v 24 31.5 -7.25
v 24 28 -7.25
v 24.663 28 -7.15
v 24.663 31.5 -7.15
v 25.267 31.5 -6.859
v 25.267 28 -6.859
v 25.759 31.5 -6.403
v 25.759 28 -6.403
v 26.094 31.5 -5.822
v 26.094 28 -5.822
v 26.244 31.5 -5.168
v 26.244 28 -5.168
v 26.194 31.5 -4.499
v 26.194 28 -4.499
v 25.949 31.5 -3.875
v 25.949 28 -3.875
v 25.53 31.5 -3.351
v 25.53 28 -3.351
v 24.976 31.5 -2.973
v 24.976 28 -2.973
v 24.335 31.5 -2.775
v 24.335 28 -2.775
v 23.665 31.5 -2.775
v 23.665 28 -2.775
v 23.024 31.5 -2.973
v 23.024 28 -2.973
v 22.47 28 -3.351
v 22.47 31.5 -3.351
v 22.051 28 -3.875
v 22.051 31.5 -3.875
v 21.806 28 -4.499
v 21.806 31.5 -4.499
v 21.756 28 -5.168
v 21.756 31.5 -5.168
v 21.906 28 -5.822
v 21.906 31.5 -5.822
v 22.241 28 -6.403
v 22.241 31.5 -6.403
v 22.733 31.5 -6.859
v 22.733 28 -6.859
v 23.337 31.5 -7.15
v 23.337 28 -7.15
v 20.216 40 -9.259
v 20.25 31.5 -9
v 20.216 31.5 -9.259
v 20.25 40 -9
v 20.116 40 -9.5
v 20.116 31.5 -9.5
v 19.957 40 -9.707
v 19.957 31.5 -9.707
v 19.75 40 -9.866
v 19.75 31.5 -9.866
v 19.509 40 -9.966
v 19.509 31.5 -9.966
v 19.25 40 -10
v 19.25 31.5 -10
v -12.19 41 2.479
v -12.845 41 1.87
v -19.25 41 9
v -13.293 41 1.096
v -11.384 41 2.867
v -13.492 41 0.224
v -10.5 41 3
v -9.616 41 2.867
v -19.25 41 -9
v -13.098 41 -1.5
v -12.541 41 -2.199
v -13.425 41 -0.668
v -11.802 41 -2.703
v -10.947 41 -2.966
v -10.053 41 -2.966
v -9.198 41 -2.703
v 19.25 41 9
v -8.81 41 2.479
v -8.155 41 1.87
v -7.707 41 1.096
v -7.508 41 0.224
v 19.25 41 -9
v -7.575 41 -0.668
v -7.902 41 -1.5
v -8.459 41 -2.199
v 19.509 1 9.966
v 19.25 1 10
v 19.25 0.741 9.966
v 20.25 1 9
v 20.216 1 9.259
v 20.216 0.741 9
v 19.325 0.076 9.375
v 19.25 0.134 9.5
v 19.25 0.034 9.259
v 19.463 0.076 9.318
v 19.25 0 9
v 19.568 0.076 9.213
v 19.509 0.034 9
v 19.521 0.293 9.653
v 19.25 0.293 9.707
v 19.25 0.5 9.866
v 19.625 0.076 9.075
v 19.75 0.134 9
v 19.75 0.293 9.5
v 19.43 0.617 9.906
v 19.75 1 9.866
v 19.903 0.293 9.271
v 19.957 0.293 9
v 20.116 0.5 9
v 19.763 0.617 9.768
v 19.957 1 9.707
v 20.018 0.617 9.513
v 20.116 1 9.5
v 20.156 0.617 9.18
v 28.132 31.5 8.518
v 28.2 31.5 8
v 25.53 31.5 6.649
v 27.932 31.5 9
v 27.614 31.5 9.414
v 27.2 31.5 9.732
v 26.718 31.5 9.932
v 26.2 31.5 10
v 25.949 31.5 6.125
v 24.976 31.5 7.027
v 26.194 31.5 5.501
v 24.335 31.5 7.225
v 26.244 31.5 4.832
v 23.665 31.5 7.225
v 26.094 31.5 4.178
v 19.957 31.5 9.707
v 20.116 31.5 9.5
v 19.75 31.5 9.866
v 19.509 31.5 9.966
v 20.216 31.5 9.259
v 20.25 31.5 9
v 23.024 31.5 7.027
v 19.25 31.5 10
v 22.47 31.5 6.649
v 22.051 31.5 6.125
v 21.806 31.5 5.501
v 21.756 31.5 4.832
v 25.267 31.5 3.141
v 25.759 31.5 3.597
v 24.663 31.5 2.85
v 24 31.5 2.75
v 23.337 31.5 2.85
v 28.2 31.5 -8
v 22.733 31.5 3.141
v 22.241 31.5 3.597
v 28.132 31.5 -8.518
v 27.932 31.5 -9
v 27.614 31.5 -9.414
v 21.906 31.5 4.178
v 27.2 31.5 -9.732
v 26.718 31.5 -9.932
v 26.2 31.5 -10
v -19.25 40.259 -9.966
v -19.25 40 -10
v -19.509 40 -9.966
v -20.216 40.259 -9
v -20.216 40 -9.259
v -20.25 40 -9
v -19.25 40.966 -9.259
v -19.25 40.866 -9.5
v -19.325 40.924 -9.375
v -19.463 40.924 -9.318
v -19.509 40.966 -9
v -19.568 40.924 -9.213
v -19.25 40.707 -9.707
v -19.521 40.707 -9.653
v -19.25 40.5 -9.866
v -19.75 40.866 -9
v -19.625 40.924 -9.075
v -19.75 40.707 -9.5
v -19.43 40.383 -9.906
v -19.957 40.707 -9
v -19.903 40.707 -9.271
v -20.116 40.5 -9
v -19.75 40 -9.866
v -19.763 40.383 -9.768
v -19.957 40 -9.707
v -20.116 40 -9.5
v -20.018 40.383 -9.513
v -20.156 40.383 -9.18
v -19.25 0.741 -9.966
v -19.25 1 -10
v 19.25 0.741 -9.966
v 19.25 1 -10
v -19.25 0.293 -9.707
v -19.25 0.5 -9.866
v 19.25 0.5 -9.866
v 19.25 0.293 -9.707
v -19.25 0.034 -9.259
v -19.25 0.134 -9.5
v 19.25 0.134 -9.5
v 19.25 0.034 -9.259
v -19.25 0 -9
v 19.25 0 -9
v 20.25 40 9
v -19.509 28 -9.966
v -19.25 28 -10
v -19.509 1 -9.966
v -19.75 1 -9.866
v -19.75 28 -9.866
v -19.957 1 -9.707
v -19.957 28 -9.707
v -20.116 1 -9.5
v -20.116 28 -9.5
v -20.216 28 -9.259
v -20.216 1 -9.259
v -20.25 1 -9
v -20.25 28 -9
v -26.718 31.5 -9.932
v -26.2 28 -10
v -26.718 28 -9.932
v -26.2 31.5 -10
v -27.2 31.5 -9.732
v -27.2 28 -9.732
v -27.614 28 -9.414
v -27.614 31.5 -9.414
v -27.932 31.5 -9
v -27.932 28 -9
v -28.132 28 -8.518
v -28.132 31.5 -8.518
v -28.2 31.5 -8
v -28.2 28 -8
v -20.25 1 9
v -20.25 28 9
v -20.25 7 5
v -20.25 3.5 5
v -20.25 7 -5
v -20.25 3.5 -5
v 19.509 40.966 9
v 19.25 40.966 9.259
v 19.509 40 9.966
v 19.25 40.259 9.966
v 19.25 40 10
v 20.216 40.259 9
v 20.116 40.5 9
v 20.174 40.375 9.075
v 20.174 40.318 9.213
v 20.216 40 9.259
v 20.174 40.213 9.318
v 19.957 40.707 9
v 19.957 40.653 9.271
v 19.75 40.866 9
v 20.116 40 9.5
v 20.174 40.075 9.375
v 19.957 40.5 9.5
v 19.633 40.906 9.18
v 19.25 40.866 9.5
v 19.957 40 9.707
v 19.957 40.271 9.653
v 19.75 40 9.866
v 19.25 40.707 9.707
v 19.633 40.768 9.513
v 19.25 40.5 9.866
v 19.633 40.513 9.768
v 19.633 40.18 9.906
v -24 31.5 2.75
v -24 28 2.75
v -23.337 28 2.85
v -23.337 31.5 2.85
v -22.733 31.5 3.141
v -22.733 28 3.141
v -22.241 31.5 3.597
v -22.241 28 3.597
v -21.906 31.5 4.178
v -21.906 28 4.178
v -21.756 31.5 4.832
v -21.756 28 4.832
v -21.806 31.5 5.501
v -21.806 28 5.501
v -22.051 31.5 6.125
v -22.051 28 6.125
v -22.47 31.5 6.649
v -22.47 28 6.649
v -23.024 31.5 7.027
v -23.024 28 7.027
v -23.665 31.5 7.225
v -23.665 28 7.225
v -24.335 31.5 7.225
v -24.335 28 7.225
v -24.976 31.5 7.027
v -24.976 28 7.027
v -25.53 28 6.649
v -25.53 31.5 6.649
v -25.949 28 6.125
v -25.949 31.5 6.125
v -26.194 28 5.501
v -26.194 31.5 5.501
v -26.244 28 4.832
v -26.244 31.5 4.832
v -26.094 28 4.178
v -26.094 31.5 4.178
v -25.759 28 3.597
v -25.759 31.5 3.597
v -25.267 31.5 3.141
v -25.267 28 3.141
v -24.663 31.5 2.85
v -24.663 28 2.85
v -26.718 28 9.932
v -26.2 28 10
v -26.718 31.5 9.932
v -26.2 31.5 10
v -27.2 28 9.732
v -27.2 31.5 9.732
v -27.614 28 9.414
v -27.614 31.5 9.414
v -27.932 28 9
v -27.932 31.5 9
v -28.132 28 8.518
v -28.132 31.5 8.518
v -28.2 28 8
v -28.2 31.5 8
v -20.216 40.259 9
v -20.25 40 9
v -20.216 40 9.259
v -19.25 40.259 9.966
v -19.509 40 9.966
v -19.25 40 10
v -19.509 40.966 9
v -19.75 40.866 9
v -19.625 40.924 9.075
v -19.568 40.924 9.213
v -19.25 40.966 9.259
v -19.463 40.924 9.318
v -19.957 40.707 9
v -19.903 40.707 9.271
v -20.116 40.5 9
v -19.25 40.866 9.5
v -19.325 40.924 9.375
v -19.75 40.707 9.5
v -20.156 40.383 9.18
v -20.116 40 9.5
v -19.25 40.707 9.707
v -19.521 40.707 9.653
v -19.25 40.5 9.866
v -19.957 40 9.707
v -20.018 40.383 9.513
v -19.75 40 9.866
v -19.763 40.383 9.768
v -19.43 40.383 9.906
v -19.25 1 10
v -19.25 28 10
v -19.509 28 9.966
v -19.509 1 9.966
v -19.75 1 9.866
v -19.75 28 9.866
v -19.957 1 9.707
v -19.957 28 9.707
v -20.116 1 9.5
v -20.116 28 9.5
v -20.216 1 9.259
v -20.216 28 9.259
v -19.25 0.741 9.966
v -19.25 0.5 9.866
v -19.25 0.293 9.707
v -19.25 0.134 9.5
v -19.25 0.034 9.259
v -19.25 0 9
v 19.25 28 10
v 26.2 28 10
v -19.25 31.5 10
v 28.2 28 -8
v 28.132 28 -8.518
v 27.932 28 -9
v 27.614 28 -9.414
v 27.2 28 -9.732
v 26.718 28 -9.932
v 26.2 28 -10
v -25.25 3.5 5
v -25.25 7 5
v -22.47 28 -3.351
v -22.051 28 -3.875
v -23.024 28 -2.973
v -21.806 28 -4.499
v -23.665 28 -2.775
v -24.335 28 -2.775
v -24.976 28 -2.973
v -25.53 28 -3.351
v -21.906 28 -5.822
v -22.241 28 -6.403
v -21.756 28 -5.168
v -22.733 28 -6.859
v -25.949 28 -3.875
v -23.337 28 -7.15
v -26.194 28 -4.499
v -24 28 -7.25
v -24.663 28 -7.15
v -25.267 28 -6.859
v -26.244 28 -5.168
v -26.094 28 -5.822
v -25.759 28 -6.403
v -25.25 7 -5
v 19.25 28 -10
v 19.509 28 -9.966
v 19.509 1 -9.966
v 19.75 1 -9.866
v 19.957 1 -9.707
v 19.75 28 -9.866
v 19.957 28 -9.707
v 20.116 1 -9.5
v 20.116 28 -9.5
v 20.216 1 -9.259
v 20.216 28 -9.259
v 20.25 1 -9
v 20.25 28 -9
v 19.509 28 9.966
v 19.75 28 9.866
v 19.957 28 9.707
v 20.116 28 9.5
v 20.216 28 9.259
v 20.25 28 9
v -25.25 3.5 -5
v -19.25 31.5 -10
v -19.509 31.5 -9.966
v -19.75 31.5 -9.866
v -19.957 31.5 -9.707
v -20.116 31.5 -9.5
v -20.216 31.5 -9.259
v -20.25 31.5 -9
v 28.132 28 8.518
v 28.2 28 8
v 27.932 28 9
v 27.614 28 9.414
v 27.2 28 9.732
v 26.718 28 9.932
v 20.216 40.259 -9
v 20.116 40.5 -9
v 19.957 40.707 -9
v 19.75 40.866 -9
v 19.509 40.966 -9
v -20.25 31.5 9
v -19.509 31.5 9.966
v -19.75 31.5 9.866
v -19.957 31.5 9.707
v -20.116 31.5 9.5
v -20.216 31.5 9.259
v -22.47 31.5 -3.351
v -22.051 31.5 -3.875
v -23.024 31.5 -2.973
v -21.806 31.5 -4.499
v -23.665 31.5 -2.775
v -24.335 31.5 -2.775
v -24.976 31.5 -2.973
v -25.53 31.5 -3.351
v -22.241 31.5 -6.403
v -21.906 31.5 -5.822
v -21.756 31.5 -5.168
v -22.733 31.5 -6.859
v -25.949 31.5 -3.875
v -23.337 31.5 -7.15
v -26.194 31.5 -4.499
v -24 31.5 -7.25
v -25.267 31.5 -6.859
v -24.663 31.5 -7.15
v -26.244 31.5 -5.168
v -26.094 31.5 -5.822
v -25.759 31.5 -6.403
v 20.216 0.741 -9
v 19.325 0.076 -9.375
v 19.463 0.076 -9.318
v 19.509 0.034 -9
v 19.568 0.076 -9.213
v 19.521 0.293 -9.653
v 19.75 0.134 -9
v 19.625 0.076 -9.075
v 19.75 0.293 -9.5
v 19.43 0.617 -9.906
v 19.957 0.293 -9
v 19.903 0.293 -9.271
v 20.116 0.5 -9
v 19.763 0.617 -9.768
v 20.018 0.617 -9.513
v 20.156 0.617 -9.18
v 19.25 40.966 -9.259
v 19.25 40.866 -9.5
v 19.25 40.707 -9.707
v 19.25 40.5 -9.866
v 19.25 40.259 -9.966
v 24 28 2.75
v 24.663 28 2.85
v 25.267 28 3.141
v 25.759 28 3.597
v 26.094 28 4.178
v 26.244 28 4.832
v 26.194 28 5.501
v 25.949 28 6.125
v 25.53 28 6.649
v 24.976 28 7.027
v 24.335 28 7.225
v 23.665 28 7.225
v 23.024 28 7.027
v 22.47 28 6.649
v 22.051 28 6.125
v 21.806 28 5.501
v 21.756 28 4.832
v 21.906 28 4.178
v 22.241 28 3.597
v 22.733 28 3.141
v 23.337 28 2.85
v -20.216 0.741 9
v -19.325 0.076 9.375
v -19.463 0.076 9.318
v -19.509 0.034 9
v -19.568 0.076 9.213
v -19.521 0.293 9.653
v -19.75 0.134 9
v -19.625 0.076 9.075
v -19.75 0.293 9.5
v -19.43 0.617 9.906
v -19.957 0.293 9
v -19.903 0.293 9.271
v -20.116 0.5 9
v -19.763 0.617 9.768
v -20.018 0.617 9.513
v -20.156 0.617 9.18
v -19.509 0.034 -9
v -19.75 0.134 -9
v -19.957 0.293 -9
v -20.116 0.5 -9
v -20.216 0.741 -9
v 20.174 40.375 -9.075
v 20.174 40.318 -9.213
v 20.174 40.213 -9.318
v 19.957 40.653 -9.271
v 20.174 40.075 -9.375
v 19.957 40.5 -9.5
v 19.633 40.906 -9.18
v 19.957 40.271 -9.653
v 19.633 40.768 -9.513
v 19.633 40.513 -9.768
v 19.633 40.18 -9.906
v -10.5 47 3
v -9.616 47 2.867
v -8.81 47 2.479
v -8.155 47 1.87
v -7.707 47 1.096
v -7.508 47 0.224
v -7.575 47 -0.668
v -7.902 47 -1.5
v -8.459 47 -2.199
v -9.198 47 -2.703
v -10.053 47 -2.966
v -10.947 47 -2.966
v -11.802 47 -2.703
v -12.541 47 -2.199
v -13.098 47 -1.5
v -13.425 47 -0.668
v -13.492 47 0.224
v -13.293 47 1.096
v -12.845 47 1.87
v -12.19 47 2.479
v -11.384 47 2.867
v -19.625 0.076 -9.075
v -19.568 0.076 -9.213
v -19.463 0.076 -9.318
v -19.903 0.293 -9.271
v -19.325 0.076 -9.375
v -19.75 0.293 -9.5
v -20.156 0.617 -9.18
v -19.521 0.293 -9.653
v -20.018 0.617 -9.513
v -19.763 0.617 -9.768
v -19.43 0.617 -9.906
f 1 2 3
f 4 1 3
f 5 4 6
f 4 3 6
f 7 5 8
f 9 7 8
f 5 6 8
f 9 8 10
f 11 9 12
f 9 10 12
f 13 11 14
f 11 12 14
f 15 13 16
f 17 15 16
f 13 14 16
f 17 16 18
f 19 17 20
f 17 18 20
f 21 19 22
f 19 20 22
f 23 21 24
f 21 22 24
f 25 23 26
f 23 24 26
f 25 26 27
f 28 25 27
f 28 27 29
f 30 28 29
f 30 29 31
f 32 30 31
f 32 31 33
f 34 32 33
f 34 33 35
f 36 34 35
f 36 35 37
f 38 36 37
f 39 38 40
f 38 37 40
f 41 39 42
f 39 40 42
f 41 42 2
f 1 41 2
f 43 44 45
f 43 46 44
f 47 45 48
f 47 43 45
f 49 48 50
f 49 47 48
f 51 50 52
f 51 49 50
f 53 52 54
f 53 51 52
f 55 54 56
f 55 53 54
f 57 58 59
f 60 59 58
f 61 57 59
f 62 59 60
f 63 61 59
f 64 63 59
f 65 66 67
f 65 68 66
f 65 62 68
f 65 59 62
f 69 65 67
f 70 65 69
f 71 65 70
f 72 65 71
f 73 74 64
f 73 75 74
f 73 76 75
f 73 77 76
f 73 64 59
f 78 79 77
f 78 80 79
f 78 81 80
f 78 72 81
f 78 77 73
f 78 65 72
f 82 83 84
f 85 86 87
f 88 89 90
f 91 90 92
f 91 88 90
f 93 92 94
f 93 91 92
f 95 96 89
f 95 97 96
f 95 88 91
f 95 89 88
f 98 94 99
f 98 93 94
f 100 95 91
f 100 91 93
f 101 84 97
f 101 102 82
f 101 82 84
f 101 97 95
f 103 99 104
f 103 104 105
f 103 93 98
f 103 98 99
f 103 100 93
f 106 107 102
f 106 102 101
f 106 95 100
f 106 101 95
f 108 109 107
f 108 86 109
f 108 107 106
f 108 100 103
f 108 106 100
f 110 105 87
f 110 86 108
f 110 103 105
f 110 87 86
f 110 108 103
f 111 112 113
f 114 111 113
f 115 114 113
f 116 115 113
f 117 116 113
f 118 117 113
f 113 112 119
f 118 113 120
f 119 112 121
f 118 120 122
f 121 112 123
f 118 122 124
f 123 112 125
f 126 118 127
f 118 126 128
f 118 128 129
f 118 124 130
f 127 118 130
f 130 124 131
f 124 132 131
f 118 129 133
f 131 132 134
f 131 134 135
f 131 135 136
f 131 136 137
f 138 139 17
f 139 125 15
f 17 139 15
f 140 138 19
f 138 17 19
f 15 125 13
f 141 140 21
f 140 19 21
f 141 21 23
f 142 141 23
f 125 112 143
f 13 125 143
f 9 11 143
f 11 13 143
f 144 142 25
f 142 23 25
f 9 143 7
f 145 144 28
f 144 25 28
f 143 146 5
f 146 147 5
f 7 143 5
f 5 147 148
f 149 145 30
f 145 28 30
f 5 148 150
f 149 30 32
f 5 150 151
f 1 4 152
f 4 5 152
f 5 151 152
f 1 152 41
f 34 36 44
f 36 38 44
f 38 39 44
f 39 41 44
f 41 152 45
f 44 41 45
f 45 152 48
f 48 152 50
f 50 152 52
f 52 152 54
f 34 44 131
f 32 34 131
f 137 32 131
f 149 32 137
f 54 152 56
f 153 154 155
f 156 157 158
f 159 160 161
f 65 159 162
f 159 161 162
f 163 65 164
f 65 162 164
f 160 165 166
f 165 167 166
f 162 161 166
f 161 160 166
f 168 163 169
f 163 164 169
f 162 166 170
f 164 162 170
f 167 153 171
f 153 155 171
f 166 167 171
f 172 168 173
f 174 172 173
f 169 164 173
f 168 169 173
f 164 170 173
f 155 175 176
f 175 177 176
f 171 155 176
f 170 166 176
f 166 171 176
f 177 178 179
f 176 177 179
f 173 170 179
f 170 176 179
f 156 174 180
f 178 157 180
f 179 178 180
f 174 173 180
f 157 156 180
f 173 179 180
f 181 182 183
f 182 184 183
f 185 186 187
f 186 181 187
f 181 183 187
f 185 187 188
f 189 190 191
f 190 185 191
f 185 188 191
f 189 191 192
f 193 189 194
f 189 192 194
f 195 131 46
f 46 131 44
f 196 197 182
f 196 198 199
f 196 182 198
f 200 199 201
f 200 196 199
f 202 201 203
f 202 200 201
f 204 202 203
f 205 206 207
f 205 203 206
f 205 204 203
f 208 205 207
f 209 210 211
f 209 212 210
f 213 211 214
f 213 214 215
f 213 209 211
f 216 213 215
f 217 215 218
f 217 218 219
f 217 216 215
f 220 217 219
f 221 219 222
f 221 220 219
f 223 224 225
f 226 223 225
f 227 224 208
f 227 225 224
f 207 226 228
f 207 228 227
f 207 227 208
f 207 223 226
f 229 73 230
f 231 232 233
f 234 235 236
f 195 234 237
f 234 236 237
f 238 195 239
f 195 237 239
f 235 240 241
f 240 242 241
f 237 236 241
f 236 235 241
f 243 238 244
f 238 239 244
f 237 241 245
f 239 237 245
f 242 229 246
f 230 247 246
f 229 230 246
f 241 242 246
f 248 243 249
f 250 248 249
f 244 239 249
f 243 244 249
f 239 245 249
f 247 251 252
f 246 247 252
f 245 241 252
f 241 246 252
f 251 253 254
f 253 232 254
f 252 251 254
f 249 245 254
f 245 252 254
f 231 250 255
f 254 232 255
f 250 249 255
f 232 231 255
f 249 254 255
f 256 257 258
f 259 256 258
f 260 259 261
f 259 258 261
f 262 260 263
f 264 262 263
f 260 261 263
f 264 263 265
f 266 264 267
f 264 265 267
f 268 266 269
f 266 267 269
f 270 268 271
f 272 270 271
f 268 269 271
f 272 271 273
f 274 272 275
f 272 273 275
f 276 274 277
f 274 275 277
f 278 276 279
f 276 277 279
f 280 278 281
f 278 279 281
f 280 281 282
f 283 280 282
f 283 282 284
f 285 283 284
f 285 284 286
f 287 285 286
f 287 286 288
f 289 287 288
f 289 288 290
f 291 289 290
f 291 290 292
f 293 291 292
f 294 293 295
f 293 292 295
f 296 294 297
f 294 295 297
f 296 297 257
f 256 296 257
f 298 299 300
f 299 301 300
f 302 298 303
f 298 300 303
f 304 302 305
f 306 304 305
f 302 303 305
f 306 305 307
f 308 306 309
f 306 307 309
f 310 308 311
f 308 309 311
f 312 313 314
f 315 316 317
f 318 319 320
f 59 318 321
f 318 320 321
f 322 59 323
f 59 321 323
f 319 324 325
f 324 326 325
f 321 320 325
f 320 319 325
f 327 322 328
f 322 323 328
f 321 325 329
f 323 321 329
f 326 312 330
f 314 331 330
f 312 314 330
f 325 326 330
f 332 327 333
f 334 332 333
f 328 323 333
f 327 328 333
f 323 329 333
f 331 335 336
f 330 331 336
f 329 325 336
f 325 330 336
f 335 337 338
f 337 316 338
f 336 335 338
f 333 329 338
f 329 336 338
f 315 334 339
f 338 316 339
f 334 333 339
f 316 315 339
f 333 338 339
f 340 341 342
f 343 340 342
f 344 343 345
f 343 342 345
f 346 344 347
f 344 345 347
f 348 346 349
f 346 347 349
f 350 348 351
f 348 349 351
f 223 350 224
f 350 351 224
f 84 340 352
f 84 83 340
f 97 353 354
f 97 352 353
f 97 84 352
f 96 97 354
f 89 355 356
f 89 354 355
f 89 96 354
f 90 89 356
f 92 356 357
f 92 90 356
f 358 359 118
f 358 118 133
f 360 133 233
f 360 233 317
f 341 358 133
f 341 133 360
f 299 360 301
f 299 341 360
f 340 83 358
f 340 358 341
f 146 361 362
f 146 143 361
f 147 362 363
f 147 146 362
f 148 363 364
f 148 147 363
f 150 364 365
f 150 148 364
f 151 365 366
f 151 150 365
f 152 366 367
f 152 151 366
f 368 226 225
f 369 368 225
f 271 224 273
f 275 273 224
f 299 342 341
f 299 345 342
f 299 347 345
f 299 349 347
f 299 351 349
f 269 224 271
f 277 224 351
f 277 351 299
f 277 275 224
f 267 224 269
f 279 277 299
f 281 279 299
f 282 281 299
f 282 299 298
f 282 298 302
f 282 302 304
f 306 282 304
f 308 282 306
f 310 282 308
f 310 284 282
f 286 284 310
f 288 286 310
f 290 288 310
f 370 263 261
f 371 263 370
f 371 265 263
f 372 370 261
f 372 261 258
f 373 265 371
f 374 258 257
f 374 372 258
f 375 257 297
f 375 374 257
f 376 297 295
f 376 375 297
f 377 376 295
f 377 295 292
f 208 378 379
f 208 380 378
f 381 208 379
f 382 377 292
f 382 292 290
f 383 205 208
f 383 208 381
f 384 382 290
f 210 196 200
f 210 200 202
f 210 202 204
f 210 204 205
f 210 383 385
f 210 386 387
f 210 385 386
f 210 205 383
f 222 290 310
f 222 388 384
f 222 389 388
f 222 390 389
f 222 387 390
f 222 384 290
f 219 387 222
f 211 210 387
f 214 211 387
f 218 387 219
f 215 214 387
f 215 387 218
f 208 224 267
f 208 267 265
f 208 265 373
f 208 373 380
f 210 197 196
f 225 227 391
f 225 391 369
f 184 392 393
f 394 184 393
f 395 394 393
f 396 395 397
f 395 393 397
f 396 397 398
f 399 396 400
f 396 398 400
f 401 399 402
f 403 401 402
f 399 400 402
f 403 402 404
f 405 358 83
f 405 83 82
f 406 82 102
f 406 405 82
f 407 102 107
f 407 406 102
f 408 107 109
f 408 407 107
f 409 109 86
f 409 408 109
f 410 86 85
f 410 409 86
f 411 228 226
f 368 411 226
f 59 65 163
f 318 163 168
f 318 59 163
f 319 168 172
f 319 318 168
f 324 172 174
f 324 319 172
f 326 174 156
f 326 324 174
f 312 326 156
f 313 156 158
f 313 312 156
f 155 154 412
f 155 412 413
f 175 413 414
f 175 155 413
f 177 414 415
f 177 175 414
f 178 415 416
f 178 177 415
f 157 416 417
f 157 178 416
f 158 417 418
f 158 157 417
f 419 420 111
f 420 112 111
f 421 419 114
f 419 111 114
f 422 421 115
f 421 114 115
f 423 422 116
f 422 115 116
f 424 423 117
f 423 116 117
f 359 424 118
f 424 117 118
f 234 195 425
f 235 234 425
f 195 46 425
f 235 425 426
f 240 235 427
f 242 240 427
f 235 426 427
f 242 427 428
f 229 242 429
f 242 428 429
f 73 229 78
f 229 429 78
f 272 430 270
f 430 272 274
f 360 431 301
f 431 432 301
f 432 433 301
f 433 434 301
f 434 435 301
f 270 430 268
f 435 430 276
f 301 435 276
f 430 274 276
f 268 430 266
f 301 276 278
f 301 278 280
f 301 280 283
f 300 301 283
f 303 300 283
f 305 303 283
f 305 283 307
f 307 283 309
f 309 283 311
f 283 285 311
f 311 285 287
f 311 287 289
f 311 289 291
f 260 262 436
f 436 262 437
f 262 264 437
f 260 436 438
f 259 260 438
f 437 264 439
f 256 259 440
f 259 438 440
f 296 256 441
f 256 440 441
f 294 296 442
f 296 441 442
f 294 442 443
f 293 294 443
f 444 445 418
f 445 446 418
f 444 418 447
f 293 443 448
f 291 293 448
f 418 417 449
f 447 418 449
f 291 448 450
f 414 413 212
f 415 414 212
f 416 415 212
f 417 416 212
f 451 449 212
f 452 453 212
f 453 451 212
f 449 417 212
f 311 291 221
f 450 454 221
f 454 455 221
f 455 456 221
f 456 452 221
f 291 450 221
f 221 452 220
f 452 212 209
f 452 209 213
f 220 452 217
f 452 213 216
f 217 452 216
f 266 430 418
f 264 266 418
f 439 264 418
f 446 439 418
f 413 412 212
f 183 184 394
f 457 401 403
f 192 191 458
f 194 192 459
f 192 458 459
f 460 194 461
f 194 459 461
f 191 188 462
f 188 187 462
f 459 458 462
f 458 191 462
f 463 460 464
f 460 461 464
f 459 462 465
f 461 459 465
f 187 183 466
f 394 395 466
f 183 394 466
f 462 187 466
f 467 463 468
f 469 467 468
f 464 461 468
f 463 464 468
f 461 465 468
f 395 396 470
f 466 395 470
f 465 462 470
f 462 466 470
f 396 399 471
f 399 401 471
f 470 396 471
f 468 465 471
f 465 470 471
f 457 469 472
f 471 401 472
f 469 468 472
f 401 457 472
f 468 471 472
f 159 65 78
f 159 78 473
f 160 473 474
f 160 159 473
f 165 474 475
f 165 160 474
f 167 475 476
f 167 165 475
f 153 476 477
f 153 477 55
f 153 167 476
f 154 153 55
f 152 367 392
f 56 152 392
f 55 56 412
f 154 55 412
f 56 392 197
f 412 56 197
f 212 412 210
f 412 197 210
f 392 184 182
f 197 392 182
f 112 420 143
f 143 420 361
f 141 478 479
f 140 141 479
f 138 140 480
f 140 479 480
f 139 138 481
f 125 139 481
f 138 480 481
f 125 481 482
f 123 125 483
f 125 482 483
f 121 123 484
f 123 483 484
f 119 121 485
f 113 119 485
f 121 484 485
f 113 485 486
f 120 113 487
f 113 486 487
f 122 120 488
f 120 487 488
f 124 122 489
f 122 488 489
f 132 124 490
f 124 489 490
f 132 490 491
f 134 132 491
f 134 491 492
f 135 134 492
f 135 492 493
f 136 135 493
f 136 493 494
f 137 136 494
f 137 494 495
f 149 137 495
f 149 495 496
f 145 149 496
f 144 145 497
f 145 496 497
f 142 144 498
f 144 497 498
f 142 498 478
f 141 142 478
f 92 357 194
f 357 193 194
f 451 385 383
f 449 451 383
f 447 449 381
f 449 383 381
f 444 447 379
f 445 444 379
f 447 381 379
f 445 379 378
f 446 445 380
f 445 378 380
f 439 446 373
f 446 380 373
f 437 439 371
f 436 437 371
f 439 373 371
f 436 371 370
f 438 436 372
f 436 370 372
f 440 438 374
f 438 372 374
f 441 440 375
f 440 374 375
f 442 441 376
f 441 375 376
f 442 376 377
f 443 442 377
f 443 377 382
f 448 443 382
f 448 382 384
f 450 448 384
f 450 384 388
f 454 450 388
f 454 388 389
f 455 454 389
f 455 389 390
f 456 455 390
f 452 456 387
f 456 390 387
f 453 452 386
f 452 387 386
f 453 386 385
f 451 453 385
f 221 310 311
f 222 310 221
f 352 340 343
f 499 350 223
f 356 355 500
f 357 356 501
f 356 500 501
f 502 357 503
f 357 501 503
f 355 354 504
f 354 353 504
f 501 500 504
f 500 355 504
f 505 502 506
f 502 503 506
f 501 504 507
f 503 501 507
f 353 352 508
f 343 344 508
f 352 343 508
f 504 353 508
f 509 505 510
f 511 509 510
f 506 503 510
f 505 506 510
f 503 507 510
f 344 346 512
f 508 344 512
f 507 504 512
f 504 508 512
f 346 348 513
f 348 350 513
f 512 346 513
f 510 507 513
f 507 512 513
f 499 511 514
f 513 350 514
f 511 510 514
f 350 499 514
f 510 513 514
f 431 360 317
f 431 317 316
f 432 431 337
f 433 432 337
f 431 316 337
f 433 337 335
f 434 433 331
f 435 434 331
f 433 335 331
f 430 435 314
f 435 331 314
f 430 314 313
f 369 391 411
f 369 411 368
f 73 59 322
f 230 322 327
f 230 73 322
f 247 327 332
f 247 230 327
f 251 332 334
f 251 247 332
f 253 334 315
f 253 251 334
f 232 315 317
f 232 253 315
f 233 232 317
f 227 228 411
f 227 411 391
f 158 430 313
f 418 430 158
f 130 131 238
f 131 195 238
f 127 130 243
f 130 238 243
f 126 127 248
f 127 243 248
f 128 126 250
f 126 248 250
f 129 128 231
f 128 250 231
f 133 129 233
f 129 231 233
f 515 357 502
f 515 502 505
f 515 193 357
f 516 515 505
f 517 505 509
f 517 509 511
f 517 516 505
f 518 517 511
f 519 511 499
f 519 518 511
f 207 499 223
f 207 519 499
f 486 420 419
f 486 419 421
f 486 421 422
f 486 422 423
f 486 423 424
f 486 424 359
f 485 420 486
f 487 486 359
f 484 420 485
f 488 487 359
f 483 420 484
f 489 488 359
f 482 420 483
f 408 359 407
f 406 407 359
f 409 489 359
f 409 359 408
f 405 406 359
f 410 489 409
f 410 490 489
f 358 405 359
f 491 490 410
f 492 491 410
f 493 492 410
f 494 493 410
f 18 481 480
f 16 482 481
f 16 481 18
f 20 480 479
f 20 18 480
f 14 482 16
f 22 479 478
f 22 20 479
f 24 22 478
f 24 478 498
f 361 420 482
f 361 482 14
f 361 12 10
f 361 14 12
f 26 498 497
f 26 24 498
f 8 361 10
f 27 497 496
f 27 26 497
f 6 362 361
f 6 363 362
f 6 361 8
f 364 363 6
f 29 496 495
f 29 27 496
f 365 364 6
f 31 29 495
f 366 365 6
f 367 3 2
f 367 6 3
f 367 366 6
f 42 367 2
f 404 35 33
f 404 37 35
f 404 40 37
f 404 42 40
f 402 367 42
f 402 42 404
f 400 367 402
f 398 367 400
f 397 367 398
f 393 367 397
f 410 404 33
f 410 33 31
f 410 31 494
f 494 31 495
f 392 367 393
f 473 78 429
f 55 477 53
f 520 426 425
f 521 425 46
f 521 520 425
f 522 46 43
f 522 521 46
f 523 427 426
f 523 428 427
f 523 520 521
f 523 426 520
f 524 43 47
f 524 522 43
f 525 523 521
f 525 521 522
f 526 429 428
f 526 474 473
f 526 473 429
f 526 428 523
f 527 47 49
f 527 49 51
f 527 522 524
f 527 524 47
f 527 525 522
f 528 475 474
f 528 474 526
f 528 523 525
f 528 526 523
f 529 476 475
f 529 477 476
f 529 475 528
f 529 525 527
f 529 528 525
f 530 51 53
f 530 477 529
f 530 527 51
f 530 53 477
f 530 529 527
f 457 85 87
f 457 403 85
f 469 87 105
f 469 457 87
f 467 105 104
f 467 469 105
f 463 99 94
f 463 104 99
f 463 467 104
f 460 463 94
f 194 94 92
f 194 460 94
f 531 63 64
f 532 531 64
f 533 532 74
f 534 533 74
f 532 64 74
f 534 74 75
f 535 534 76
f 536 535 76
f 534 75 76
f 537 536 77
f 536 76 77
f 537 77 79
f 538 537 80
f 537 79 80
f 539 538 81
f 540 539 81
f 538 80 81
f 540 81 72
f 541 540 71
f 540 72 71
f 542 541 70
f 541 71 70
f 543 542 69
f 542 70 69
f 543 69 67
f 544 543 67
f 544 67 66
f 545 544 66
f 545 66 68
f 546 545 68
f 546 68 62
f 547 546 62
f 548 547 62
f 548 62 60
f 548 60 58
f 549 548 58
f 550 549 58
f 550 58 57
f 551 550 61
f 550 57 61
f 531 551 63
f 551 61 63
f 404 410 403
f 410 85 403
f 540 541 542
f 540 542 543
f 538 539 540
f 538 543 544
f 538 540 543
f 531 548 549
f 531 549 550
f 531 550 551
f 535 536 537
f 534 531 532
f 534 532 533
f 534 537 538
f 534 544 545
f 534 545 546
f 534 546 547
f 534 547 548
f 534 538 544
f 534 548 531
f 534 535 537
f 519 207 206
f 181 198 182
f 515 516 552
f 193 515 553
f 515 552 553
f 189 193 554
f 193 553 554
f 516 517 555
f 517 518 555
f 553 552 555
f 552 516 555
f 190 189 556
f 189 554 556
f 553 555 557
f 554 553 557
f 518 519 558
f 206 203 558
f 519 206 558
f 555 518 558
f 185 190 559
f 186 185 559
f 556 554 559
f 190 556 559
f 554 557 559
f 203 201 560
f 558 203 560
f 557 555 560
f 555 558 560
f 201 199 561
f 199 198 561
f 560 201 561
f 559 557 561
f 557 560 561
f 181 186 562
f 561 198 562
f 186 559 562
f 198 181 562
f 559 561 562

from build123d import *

# Parameters (mm, degrees)
SKETCH1_W           = 40.5
SKETCH1_H           = 20
BOSS_EXTRUDE1_DEPTH = 41
SKETCH2_W           = 56.4
SKETCH2_H           = 20
SKETCH2_R           = 2.25
BOSS_EXTRUDE2_DEPTH = 3.5
SKETCH3_R           = 3
BOSS_EXTRUDE3_DEPTH = 6
SKETCH4_W           = 10
SKETCH4_H           = 3.5
BOSS_EXTRUDE4_DEPTH = 5
FILLET1_R           = 2
FILLET2_R           = 1
FILLET3_R           = 1


with BuildPart() as part:
    # Sketch1 → Boss-Extrude1 (new body)
    with BuildSketch(Plane(origin=(0, 0, 0), x_dir=(1, 0, 0), z_dir=(0, 1, 0))):
        Rectangle(SKETCH1_W, SKETCH1_H)
    extrude(amount=BOSS_EXTRUDE1_DEPTH)

    # Sketch2 → Boss-Extrude2 (add)
    with BuildSketch(Plane(origin=(0, 28, 0), x_dir=(-1, 0, 0), z_dir=(0, -1, 0))):
        Rectangle(SKETCH2_W, SKETCH2_H)
        with Locations(Location((-24, 5, 0), (0, 0, 90))):
            Circle(SKETCH2_R, mode=Mode.SUBTRACT)
        with Locations(Location((24, 5, 0), (0, 0, 90))):
            Circle(SKETCH2_R, mode=Mode.SUBTRACT)
        with Locations(Location((24, -5, 0), (0, 0, 90))):
            Circle(SKETCH2_R, mode=Mode.SUBTRACT)
        with Locations(Location((-24, -5, 0), (0, 0, 90))):
            Circle(SKETCH2_R, mode=Mode.SUBTRACT)
    extrude(amount=-BOSS_EXTRUDE2_DEPTH)

    # Sketch3 → Boss-Extrude3 (add)
    with BuildSketch(Plane(origin=(0, 41, 0), x_dir=(1, 0, 0), z_dir=(0, 1, 0))):
        with Locations(Location((-10.5, 0, 0), (0, 0, 270))):
            Circle(SKETCH3_R)
    extrude(amount=BOSS_EXTRUDE3_DEPTH)

    # Sketch4 → Boss-Extrude4 (add)
    with BuildSketch(Plane.ZY.offset(20.25)):
        with Locations((0, 5.25)):
            Rectangle(SKETCH4_W, SKETCH4_H)
    extrude(amount=BOSS_EXTRUDE4_DEPTH)

    # Fillet1
    fillet1_edges = [part.edges().sort_by_distance(p)[0] for p in [
        (28.2, 29.75, -10),
        (-28.2, 29.75, 10),
        (28.2, 29.75, 10),
        (-28.2, 29.75, -10),
    ]]
    fillet(fillet1_edges, radius=FILLET1_R)

    # Fillet2
    fillet2_edges = [part.edges().sort_by_distance(p)[0] for p in [
        (20.25, 14, 10),
        (-20.25, 14, 10),
        (-20.25, 14, -10),
        (20.25, 14, -10),
        (0, 0, 10),
        (-20.25, 0, 0),
        (0, 0, -10),
        (20.25, 0, 0),
        (-20.25, 36.25, 10),
        (-20.25, 36.25, -10),
    ]]
    fillet(fillet2_edges, radius=FILLET2_R)

    # Fillet3
    fillet3_edges = [part.edges().sort_by_distance(p)[0] for p in [
        (0.5, 41, 10),
        (-20.25, 41, 0),
        (-19.957106781, 41, 9.707106781),
        (-19.957106781, 41, -9.707106781),
        (20.25, 41, 0),
        (20.25, 36.25, 10),
        (20.25, 36.25, -10),
        (0.5, 41, -10),
    ]]
    fillet(fillet3_edges, radius=FILLET3_R)


solid = part.part
